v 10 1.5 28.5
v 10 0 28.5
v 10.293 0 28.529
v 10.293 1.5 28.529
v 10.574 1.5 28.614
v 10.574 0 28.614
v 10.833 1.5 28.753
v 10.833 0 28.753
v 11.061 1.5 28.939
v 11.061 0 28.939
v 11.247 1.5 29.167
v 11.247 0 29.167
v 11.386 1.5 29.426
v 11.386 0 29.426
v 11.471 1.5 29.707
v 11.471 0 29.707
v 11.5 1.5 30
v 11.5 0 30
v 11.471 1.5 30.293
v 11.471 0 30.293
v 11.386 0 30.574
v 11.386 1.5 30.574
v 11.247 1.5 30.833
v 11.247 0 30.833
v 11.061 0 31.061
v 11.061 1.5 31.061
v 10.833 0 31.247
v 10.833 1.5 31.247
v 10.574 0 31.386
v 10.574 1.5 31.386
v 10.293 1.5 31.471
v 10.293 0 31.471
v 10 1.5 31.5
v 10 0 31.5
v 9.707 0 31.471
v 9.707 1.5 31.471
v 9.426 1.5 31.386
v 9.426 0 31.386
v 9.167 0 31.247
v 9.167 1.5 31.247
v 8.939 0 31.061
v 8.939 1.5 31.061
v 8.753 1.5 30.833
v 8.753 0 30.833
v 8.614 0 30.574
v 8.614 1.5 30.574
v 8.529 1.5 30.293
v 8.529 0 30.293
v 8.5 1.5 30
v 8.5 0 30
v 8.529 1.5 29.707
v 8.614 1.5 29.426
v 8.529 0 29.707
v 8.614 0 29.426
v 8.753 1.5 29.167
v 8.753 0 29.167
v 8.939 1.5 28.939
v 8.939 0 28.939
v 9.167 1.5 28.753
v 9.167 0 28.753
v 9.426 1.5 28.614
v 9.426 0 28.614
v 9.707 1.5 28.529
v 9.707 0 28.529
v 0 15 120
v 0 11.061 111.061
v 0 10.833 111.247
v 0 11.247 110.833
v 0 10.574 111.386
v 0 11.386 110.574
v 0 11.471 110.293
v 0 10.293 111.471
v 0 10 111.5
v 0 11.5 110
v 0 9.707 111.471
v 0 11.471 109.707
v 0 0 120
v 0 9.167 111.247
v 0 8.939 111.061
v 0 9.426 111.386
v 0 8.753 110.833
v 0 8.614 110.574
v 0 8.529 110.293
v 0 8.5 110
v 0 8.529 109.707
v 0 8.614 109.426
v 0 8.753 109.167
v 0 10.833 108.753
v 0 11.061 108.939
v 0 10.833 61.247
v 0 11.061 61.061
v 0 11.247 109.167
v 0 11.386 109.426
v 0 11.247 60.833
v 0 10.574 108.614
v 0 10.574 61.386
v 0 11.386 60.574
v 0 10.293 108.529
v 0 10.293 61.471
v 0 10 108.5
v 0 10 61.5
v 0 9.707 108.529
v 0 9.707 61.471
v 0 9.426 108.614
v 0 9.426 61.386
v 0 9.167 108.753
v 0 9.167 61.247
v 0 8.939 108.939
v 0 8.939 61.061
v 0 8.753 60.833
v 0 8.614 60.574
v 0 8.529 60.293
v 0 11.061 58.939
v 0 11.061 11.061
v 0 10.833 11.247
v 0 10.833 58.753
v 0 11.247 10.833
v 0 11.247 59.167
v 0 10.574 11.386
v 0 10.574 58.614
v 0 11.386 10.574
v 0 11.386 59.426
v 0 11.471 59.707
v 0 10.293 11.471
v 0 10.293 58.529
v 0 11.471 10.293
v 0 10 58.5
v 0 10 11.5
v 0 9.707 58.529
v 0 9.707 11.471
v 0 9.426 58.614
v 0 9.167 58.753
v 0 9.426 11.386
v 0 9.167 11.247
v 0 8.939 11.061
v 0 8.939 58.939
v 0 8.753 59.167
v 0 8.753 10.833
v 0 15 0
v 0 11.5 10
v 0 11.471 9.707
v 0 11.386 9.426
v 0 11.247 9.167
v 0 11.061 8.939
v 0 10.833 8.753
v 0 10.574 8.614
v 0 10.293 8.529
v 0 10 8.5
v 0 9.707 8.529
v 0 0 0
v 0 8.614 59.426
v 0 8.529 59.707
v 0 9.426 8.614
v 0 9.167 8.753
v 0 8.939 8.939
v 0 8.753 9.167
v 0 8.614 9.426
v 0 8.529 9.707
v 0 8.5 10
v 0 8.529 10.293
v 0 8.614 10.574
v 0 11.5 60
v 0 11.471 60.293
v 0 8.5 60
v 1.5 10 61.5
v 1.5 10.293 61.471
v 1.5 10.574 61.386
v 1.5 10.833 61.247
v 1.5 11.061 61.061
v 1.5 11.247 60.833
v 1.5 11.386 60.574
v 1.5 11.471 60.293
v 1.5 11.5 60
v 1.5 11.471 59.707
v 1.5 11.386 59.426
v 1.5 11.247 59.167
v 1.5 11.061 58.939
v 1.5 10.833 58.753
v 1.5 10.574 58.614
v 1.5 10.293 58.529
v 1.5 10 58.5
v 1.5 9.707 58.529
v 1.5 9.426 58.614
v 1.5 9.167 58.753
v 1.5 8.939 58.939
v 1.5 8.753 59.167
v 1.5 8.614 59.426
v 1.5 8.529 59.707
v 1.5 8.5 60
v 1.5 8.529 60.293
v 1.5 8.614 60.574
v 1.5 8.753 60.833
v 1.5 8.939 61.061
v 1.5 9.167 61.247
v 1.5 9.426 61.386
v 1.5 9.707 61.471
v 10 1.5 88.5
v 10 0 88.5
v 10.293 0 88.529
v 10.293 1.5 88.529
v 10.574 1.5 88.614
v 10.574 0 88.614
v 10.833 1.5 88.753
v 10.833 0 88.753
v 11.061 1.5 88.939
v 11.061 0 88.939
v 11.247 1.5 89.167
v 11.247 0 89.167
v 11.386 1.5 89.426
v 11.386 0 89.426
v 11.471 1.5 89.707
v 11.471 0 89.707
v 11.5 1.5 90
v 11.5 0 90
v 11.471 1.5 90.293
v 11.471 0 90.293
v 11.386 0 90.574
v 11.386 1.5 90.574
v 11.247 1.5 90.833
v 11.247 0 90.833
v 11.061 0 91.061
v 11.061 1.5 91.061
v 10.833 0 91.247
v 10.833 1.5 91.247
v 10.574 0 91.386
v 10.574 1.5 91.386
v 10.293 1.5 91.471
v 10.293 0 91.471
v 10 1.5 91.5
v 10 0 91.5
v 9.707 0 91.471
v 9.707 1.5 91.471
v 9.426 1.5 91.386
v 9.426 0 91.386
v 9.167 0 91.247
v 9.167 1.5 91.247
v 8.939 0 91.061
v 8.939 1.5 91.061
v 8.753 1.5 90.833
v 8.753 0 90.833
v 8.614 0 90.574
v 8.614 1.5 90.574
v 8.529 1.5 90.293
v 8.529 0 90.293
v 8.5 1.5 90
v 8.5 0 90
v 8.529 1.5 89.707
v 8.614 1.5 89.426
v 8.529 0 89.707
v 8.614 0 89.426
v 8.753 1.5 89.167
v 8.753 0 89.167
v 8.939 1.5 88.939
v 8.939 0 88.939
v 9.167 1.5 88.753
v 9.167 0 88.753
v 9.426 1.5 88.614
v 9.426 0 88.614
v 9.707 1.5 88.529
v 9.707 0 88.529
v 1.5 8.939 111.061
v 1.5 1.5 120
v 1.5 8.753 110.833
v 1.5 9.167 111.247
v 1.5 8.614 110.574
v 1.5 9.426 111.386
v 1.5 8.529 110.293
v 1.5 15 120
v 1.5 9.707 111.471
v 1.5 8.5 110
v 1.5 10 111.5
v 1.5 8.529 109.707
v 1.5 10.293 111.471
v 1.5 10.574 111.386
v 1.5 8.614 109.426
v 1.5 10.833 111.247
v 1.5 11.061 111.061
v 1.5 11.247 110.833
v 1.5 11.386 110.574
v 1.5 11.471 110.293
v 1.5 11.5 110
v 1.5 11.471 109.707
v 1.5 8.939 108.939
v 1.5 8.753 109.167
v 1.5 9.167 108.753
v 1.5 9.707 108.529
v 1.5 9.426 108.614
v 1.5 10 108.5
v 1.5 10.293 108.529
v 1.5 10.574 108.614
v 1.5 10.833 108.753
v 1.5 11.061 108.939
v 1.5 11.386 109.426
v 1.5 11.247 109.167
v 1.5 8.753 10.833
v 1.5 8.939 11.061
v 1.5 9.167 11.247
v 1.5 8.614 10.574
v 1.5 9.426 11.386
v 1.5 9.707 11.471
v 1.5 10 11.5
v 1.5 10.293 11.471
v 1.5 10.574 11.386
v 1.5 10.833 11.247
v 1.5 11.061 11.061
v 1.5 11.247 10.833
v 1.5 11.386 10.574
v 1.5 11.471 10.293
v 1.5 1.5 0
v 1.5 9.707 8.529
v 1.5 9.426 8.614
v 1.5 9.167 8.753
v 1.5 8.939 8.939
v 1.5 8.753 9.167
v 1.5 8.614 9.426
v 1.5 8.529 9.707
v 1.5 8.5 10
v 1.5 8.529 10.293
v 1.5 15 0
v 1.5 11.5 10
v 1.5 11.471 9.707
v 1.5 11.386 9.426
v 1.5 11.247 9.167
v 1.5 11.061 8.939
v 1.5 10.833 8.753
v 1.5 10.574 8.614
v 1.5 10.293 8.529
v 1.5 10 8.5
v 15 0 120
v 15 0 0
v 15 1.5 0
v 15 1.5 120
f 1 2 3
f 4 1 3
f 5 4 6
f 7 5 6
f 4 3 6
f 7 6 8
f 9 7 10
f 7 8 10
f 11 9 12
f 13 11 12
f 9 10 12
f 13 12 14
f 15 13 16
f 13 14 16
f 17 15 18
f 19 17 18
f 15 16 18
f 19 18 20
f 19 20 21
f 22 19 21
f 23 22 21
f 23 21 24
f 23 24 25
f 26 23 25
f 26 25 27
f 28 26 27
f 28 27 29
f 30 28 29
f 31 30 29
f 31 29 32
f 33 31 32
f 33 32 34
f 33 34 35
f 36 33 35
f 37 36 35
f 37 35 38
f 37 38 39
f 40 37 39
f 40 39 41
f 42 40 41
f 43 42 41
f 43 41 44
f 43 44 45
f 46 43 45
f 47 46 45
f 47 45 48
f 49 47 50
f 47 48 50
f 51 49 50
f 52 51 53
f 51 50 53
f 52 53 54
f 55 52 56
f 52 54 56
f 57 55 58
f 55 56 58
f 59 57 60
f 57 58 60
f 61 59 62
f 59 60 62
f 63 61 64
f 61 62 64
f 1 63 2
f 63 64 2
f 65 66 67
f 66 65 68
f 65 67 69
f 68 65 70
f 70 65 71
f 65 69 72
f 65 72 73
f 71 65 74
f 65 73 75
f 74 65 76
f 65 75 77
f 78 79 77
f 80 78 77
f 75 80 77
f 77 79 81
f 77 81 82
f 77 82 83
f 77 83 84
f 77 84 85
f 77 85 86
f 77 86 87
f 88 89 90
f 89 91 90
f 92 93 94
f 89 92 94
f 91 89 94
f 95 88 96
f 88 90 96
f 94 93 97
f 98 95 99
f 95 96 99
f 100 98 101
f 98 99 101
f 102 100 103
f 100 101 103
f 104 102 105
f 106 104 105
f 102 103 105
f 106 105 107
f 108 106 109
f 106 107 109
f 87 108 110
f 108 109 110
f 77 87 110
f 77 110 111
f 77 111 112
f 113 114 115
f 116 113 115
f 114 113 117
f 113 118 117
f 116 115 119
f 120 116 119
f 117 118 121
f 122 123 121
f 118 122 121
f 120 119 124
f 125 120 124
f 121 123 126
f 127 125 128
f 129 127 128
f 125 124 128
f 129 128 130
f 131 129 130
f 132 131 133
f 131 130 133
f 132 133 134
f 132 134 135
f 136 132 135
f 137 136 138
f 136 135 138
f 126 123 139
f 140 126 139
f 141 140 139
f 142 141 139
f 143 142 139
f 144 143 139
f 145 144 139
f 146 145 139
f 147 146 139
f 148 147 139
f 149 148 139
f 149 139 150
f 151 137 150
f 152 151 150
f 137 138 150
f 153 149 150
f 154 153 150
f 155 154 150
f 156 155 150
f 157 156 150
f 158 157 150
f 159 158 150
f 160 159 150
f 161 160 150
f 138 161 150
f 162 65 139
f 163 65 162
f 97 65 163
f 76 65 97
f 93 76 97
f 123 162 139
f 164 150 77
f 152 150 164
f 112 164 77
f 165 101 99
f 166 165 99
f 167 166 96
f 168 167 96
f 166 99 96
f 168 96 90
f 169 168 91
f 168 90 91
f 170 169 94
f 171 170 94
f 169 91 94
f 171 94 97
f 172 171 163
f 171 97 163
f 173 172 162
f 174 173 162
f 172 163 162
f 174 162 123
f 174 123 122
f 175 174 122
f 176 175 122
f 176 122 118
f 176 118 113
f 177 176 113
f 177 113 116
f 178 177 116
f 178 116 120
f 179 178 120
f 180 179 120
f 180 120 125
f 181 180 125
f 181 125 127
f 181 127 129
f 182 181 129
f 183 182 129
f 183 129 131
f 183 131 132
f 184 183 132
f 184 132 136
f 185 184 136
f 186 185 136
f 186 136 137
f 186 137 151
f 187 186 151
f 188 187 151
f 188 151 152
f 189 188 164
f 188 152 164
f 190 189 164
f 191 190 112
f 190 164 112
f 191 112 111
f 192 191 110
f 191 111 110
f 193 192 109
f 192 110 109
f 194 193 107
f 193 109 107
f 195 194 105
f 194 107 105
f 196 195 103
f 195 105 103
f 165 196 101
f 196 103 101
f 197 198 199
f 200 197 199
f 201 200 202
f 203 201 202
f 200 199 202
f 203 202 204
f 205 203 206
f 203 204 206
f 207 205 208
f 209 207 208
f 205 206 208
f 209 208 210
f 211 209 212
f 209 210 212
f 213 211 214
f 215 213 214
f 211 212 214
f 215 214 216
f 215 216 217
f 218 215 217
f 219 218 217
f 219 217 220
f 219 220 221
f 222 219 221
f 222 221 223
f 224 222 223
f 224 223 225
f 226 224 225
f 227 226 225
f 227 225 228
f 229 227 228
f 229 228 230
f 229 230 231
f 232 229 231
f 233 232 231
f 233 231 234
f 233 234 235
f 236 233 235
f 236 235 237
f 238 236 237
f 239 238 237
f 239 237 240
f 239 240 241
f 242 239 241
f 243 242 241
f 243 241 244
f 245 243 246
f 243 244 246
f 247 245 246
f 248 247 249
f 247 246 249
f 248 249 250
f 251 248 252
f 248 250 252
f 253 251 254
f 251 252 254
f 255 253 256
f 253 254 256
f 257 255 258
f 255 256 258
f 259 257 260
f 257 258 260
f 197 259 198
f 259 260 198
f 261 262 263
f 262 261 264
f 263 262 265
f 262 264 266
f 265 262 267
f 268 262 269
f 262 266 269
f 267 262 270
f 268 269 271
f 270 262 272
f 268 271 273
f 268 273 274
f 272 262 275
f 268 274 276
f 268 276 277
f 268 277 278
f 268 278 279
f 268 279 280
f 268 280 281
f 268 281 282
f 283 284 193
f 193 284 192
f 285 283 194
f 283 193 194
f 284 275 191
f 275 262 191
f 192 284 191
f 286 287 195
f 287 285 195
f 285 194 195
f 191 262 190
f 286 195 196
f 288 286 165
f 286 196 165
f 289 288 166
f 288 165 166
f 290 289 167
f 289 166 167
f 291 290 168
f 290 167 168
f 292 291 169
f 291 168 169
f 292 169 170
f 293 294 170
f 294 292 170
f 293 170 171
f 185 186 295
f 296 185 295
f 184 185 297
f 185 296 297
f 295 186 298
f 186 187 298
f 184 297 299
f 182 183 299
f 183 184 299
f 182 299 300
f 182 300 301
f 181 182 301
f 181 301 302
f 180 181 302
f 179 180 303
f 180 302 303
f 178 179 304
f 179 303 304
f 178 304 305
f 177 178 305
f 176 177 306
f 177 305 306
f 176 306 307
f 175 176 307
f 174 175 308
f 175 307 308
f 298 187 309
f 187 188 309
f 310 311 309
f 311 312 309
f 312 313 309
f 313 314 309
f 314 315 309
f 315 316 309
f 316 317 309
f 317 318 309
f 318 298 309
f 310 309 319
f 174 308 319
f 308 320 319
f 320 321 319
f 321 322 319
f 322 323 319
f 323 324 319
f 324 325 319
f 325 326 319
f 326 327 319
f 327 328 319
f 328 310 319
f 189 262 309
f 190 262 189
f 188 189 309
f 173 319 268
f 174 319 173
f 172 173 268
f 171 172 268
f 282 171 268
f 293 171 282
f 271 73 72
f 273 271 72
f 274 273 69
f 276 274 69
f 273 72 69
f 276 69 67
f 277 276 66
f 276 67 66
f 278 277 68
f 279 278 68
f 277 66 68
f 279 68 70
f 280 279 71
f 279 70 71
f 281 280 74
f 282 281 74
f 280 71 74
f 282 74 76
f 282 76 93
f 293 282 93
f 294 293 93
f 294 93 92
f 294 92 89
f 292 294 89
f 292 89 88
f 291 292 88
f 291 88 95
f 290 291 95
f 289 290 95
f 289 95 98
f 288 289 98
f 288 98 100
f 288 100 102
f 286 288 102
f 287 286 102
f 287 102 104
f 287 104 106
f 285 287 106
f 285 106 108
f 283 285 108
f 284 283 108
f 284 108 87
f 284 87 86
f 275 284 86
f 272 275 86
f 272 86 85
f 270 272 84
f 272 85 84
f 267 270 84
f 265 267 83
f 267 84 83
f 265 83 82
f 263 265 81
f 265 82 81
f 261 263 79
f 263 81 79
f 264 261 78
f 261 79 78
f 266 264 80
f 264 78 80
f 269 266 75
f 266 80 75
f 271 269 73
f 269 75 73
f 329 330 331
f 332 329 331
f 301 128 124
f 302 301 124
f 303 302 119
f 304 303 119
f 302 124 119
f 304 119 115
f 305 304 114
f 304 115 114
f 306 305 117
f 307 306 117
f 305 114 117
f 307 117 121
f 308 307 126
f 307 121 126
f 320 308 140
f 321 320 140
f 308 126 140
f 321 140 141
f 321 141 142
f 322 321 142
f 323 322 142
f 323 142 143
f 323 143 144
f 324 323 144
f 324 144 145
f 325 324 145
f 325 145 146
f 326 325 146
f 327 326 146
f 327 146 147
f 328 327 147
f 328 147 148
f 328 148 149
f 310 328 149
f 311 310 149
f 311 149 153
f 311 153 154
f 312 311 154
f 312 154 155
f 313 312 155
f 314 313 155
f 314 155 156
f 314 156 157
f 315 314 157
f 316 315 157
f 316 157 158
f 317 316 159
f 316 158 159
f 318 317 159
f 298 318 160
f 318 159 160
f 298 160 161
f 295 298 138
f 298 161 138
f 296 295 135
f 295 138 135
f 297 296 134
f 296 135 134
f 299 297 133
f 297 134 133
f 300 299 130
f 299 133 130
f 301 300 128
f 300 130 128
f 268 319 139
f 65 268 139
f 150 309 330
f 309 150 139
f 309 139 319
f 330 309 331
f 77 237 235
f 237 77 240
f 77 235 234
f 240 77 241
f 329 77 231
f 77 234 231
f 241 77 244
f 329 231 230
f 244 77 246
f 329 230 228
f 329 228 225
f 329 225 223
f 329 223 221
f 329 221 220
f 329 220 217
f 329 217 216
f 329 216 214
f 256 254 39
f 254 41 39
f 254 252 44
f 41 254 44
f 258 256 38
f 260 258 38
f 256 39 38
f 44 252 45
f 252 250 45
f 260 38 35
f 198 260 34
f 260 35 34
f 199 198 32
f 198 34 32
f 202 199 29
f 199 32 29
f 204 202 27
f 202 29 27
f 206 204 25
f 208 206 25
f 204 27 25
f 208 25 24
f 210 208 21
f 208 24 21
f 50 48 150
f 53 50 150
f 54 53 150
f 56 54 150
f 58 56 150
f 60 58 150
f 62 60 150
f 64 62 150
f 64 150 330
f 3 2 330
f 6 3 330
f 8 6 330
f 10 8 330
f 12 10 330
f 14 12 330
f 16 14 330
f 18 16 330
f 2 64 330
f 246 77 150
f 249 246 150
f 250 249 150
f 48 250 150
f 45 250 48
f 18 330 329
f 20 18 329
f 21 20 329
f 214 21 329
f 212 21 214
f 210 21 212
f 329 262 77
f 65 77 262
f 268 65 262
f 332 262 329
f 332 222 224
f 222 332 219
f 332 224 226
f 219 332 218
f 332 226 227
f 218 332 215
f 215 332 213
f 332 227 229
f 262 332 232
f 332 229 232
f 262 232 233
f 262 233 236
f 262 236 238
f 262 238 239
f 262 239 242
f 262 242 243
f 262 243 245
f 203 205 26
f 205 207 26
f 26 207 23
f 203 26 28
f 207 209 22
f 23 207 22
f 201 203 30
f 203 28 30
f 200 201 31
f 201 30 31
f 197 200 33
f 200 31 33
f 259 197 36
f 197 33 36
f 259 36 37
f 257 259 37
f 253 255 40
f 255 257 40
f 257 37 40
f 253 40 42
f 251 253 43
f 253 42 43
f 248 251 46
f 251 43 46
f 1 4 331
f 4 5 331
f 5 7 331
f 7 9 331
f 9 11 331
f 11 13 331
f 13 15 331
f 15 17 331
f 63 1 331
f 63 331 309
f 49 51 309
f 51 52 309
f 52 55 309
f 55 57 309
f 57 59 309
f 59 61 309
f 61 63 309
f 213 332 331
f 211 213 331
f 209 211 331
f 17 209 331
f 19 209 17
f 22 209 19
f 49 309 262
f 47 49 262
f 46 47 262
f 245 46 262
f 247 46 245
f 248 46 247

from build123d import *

# Parameters (mm, degrees)
EXTRUSION1_DEPTH                = 120
ESQUISSE2_R                     = 1.5
EXTRUSION2_DEPTH                = 122.86057607
ESQUISSE3_R                     = 1.5
EXTRUSION3_DEPTH                = 120
R_P_TITION_LIN_AIRE1_COUNT      = 2
R_P_TITION_LIN_AIRE1_PITCH      = 60
R_P_TITION_LIN_AIRE2_COUNT      = 2
R_P_TITION_LIN_AIRE2_PITCH      = 50
R_P_TITION_LIN_AIRE2_COUNT_DIR2 = 2
R_P_TITION_LIN_AIRE2_PITCH_DIR2 = 50


with BuildPart() as part:
    # Esquisse1 → Extrusion1 (new body)
    with BuildSketch(Plane.XY):
        Polygon((0, 0), (1.5, 0), (15, 0), (15, 1.5), (1.5, 1.5), (1.5, 15), (0, 15), align=None)
    extrude(amount=EXTRUSION1_DEPTH)

    # Esquisse2 → Extrusion2 (cut, through all)
    with BuildSketch(Plane.ZY):
        with Locations((60, 10)):
            Circle(ESQUISSE2_R)
    extrusion2 = extrude(amount=-EXTRUSION2_DEPTH, mode=Mode.SUBTRACT)

    # Esquisse3 → Extrusion3 (cut)
    with BuildSketch(Plane.XZ):
        with Locations((10, 90)):
            Circle(ESQUISSE3_R)
    extrusion3 = extrude(amount=-EXTRUSION3_DEPTH, mode=Mode.SUBTRACT)

    # Répétition linéaire1: Extrusion3 ×2
    with Locations(*[(0, 0, -i * R_P_TITION_LIN_AIRE1_PITCH) for i in range(1, R_P_TITION_LIN_AIRE1_COUNT)]):
        add(extrusion3, mode=Mode.SUBTRACT)

    # Répétition linéaire2: Extrusion2 2 × 2
    with Locations(*[Vector(0, 0, 1) * (i * R_P_TITION_LIN_AIRE2_PITCH) + Vector(0, 0, -1) * (j * R_P_TITION_LIN_AIRE2_PITCH_DIR2) for i in range(R_P_TITION_LIN_AIRE2_COUNT) for j in range(R_P_TITION_LIN_AIRE2_COUNT_DIR2) if (i, j) != (0, 0)]):
        add(extrusion2, mode=Mode.SUBTRACT)


solid = part.part
